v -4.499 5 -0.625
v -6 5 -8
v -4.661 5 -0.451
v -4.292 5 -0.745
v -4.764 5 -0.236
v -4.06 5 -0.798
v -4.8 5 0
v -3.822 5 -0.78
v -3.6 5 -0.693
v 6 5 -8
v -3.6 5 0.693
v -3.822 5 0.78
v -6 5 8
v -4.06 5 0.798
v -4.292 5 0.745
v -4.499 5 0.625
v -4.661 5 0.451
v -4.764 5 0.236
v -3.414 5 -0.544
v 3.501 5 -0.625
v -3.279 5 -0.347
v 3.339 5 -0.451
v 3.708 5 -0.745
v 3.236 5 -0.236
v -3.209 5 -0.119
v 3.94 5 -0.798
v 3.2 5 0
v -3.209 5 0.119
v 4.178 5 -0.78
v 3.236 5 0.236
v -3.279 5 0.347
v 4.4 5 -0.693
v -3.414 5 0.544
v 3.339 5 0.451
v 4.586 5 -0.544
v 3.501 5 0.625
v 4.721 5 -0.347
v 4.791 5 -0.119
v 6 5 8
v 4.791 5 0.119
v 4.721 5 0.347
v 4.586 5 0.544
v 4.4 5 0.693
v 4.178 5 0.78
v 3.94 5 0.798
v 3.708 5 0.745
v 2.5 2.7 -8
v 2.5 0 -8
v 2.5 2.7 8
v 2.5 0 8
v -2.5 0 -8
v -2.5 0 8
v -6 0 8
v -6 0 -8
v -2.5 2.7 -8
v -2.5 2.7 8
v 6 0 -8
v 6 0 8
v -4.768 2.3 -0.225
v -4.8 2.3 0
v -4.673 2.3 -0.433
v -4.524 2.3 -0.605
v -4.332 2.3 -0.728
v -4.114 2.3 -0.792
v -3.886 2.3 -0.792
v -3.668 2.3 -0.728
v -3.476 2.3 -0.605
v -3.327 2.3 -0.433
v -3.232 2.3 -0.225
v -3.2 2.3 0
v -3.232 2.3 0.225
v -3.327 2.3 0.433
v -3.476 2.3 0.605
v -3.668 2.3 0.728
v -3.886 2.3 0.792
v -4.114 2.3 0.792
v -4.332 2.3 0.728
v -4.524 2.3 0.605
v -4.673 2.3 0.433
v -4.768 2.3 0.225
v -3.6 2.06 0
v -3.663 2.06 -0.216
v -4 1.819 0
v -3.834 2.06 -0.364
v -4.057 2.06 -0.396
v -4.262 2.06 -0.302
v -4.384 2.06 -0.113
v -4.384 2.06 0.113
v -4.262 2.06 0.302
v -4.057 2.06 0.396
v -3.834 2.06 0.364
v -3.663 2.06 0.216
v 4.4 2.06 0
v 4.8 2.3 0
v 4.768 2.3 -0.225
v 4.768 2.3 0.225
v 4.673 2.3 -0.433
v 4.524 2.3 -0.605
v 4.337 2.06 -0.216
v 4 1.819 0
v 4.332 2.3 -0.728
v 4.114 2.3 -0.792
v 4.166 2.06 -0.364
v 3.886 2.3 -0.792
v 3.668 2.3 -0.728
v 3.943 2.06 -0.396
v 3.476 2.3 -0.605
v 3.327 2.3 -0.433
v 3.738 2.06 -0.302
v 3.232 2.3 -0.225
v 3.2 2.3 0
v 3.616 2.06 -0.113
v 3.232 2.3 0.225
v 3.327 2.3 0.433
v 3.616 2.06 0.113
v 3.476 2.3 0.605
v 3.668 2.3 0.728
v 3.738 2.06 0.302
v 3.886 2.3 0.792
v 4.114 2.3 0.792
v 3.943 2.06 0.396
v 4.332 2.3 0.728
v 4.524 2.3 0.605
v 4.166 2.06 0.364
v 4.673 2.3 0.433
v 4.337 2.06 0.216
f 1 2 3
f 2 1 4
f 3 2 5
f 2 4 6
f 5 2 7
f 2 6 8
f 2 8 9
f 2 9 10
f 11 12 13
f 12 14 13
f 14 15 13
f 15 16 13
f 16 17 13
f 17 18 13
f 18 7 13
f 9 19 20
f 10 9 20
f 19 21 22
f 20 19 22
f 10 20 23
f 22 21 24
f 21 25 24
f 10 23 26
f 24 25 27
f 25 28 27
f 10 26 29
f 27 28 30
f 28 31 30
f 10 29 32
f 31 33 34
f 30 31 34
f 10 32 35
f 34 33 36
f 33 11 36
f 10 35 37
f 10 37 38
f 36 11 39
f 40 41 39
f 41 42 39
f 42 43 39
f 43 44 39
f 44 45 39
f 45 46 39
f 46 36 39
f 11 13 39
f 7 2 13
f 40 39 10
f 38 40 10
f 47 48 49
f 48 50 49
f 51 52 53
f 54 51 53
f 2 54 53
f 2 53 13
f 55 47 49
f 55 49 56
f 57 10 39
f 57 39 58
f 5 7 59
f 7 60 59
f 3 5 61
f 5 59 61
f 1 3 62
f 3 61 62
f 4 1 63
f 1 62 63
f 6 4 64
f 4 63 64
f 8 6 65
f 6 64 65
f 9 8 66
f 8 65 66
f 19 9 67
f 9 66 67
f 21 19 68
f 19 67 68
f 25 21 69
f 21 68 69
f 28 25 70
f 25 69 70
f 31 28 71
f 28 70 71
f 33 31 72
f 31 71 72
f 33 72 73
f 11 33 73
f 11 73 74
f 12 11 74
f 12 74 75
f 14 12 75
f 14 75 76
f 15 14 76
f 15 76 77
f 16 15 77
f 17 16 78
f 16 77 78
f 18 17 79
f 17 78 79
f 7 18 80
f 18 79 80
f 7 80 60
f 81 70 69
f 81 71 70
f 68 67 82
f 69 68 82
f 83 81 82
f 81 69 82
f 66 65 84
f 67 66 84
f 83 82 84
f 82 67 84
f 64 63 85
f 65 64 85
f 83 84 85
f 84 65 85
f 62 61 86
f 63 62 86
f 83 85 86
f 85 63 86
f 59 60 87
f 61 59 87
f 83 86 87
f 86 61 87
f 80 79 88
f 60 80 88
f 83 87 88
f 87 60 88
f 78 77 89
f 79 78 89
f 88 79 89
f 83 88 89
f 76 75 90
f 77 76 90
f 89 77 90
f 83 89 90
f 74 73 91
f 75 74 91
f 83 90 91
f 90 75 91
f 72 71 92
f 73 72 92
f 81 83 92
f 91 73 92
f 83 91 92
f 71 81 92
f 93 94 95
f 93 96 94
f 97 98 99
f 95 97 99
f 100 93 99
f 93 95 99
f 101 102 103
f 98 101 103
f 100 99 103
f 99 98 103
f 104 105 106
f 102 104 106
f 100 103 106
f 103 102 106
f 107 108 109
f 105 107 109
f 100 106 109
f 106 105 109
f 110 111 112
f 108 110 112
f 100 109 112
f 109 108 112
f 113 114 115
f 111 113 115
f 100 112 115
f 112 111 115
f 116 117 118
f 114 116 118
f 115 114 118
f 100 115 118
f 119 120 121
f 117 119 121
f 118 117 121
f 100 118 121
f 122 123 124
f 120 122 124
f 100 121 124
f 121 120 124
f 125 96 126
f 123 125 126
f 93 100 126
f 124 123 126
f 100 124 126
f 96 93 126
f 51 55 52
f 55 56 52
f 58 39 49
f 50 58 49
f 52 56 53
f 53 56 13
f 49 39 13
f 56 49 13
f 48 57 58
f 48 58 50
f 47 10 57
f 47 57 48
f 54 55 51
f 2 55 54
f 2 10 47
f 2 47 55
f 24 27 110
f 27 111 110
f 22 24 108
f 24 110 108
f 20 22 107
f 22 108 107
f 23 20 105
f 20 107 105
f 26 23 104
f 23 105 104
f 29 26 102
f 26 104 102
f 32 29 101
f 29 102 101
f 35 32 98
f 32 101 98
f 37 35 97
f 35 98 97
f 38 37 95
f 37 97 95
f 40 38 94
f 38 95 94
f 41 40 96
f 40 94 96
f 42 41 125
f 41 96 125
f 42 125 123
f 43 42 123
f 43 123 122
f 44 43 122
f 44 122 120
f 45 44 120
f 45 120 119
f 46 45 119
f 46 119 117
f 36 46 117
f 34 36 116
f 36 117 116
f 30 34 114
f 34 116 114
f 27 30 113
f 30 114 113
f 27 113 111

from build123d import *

# Parameters (mm, degrees)
EXTRUDE_1_DEPTH        = 8
HOLE_WIZARD_M2_1_D     = 1.6
HOLE_WIZARD_M2_1_DEPTH = 2.7
HOLE_WIZARD_M2_1_TIP   = 0.480688495


with BuildPart() as part:
    # 草图1 → 凸台-拉伸1 (new, symmetric)
    with BuildSketch(Plane.XY):
        Polygon((-6, 5), (6, 5), (6, 0), (2.5, 0), (2.5, 2.7), (-2.5, 2.7), (-2.5, 0), (-6, 0), align=None)
    extrude(amount=EXTRUDE_1_DEPTH, both=True)

    # M2 螺纹孔1
    with Locations(Plane(origin=(0, 5, 0), x_dir=(1, 0, 0), z_dir=(0, 1, 0))):
        with Locations((-4, 0), (4, 0)):
            Hole(HOLE_WIZARD_M2_1_D / 2, depth=HOLE_WIZARD_M2_1_DEPTH)
            with Locations((0, 0, -(HOLE_WIZARD_M2_1_DEPTH + HOLE_WIZARD_M2_1_TIP / 2))):  # 118° drill point
                Cone(0, HOLE_WIZARD_M2_1_D / 2, HOLE_WIZARD_M2_1_TIP, mode=Mode.SUBTRACT)


solid = part.part
